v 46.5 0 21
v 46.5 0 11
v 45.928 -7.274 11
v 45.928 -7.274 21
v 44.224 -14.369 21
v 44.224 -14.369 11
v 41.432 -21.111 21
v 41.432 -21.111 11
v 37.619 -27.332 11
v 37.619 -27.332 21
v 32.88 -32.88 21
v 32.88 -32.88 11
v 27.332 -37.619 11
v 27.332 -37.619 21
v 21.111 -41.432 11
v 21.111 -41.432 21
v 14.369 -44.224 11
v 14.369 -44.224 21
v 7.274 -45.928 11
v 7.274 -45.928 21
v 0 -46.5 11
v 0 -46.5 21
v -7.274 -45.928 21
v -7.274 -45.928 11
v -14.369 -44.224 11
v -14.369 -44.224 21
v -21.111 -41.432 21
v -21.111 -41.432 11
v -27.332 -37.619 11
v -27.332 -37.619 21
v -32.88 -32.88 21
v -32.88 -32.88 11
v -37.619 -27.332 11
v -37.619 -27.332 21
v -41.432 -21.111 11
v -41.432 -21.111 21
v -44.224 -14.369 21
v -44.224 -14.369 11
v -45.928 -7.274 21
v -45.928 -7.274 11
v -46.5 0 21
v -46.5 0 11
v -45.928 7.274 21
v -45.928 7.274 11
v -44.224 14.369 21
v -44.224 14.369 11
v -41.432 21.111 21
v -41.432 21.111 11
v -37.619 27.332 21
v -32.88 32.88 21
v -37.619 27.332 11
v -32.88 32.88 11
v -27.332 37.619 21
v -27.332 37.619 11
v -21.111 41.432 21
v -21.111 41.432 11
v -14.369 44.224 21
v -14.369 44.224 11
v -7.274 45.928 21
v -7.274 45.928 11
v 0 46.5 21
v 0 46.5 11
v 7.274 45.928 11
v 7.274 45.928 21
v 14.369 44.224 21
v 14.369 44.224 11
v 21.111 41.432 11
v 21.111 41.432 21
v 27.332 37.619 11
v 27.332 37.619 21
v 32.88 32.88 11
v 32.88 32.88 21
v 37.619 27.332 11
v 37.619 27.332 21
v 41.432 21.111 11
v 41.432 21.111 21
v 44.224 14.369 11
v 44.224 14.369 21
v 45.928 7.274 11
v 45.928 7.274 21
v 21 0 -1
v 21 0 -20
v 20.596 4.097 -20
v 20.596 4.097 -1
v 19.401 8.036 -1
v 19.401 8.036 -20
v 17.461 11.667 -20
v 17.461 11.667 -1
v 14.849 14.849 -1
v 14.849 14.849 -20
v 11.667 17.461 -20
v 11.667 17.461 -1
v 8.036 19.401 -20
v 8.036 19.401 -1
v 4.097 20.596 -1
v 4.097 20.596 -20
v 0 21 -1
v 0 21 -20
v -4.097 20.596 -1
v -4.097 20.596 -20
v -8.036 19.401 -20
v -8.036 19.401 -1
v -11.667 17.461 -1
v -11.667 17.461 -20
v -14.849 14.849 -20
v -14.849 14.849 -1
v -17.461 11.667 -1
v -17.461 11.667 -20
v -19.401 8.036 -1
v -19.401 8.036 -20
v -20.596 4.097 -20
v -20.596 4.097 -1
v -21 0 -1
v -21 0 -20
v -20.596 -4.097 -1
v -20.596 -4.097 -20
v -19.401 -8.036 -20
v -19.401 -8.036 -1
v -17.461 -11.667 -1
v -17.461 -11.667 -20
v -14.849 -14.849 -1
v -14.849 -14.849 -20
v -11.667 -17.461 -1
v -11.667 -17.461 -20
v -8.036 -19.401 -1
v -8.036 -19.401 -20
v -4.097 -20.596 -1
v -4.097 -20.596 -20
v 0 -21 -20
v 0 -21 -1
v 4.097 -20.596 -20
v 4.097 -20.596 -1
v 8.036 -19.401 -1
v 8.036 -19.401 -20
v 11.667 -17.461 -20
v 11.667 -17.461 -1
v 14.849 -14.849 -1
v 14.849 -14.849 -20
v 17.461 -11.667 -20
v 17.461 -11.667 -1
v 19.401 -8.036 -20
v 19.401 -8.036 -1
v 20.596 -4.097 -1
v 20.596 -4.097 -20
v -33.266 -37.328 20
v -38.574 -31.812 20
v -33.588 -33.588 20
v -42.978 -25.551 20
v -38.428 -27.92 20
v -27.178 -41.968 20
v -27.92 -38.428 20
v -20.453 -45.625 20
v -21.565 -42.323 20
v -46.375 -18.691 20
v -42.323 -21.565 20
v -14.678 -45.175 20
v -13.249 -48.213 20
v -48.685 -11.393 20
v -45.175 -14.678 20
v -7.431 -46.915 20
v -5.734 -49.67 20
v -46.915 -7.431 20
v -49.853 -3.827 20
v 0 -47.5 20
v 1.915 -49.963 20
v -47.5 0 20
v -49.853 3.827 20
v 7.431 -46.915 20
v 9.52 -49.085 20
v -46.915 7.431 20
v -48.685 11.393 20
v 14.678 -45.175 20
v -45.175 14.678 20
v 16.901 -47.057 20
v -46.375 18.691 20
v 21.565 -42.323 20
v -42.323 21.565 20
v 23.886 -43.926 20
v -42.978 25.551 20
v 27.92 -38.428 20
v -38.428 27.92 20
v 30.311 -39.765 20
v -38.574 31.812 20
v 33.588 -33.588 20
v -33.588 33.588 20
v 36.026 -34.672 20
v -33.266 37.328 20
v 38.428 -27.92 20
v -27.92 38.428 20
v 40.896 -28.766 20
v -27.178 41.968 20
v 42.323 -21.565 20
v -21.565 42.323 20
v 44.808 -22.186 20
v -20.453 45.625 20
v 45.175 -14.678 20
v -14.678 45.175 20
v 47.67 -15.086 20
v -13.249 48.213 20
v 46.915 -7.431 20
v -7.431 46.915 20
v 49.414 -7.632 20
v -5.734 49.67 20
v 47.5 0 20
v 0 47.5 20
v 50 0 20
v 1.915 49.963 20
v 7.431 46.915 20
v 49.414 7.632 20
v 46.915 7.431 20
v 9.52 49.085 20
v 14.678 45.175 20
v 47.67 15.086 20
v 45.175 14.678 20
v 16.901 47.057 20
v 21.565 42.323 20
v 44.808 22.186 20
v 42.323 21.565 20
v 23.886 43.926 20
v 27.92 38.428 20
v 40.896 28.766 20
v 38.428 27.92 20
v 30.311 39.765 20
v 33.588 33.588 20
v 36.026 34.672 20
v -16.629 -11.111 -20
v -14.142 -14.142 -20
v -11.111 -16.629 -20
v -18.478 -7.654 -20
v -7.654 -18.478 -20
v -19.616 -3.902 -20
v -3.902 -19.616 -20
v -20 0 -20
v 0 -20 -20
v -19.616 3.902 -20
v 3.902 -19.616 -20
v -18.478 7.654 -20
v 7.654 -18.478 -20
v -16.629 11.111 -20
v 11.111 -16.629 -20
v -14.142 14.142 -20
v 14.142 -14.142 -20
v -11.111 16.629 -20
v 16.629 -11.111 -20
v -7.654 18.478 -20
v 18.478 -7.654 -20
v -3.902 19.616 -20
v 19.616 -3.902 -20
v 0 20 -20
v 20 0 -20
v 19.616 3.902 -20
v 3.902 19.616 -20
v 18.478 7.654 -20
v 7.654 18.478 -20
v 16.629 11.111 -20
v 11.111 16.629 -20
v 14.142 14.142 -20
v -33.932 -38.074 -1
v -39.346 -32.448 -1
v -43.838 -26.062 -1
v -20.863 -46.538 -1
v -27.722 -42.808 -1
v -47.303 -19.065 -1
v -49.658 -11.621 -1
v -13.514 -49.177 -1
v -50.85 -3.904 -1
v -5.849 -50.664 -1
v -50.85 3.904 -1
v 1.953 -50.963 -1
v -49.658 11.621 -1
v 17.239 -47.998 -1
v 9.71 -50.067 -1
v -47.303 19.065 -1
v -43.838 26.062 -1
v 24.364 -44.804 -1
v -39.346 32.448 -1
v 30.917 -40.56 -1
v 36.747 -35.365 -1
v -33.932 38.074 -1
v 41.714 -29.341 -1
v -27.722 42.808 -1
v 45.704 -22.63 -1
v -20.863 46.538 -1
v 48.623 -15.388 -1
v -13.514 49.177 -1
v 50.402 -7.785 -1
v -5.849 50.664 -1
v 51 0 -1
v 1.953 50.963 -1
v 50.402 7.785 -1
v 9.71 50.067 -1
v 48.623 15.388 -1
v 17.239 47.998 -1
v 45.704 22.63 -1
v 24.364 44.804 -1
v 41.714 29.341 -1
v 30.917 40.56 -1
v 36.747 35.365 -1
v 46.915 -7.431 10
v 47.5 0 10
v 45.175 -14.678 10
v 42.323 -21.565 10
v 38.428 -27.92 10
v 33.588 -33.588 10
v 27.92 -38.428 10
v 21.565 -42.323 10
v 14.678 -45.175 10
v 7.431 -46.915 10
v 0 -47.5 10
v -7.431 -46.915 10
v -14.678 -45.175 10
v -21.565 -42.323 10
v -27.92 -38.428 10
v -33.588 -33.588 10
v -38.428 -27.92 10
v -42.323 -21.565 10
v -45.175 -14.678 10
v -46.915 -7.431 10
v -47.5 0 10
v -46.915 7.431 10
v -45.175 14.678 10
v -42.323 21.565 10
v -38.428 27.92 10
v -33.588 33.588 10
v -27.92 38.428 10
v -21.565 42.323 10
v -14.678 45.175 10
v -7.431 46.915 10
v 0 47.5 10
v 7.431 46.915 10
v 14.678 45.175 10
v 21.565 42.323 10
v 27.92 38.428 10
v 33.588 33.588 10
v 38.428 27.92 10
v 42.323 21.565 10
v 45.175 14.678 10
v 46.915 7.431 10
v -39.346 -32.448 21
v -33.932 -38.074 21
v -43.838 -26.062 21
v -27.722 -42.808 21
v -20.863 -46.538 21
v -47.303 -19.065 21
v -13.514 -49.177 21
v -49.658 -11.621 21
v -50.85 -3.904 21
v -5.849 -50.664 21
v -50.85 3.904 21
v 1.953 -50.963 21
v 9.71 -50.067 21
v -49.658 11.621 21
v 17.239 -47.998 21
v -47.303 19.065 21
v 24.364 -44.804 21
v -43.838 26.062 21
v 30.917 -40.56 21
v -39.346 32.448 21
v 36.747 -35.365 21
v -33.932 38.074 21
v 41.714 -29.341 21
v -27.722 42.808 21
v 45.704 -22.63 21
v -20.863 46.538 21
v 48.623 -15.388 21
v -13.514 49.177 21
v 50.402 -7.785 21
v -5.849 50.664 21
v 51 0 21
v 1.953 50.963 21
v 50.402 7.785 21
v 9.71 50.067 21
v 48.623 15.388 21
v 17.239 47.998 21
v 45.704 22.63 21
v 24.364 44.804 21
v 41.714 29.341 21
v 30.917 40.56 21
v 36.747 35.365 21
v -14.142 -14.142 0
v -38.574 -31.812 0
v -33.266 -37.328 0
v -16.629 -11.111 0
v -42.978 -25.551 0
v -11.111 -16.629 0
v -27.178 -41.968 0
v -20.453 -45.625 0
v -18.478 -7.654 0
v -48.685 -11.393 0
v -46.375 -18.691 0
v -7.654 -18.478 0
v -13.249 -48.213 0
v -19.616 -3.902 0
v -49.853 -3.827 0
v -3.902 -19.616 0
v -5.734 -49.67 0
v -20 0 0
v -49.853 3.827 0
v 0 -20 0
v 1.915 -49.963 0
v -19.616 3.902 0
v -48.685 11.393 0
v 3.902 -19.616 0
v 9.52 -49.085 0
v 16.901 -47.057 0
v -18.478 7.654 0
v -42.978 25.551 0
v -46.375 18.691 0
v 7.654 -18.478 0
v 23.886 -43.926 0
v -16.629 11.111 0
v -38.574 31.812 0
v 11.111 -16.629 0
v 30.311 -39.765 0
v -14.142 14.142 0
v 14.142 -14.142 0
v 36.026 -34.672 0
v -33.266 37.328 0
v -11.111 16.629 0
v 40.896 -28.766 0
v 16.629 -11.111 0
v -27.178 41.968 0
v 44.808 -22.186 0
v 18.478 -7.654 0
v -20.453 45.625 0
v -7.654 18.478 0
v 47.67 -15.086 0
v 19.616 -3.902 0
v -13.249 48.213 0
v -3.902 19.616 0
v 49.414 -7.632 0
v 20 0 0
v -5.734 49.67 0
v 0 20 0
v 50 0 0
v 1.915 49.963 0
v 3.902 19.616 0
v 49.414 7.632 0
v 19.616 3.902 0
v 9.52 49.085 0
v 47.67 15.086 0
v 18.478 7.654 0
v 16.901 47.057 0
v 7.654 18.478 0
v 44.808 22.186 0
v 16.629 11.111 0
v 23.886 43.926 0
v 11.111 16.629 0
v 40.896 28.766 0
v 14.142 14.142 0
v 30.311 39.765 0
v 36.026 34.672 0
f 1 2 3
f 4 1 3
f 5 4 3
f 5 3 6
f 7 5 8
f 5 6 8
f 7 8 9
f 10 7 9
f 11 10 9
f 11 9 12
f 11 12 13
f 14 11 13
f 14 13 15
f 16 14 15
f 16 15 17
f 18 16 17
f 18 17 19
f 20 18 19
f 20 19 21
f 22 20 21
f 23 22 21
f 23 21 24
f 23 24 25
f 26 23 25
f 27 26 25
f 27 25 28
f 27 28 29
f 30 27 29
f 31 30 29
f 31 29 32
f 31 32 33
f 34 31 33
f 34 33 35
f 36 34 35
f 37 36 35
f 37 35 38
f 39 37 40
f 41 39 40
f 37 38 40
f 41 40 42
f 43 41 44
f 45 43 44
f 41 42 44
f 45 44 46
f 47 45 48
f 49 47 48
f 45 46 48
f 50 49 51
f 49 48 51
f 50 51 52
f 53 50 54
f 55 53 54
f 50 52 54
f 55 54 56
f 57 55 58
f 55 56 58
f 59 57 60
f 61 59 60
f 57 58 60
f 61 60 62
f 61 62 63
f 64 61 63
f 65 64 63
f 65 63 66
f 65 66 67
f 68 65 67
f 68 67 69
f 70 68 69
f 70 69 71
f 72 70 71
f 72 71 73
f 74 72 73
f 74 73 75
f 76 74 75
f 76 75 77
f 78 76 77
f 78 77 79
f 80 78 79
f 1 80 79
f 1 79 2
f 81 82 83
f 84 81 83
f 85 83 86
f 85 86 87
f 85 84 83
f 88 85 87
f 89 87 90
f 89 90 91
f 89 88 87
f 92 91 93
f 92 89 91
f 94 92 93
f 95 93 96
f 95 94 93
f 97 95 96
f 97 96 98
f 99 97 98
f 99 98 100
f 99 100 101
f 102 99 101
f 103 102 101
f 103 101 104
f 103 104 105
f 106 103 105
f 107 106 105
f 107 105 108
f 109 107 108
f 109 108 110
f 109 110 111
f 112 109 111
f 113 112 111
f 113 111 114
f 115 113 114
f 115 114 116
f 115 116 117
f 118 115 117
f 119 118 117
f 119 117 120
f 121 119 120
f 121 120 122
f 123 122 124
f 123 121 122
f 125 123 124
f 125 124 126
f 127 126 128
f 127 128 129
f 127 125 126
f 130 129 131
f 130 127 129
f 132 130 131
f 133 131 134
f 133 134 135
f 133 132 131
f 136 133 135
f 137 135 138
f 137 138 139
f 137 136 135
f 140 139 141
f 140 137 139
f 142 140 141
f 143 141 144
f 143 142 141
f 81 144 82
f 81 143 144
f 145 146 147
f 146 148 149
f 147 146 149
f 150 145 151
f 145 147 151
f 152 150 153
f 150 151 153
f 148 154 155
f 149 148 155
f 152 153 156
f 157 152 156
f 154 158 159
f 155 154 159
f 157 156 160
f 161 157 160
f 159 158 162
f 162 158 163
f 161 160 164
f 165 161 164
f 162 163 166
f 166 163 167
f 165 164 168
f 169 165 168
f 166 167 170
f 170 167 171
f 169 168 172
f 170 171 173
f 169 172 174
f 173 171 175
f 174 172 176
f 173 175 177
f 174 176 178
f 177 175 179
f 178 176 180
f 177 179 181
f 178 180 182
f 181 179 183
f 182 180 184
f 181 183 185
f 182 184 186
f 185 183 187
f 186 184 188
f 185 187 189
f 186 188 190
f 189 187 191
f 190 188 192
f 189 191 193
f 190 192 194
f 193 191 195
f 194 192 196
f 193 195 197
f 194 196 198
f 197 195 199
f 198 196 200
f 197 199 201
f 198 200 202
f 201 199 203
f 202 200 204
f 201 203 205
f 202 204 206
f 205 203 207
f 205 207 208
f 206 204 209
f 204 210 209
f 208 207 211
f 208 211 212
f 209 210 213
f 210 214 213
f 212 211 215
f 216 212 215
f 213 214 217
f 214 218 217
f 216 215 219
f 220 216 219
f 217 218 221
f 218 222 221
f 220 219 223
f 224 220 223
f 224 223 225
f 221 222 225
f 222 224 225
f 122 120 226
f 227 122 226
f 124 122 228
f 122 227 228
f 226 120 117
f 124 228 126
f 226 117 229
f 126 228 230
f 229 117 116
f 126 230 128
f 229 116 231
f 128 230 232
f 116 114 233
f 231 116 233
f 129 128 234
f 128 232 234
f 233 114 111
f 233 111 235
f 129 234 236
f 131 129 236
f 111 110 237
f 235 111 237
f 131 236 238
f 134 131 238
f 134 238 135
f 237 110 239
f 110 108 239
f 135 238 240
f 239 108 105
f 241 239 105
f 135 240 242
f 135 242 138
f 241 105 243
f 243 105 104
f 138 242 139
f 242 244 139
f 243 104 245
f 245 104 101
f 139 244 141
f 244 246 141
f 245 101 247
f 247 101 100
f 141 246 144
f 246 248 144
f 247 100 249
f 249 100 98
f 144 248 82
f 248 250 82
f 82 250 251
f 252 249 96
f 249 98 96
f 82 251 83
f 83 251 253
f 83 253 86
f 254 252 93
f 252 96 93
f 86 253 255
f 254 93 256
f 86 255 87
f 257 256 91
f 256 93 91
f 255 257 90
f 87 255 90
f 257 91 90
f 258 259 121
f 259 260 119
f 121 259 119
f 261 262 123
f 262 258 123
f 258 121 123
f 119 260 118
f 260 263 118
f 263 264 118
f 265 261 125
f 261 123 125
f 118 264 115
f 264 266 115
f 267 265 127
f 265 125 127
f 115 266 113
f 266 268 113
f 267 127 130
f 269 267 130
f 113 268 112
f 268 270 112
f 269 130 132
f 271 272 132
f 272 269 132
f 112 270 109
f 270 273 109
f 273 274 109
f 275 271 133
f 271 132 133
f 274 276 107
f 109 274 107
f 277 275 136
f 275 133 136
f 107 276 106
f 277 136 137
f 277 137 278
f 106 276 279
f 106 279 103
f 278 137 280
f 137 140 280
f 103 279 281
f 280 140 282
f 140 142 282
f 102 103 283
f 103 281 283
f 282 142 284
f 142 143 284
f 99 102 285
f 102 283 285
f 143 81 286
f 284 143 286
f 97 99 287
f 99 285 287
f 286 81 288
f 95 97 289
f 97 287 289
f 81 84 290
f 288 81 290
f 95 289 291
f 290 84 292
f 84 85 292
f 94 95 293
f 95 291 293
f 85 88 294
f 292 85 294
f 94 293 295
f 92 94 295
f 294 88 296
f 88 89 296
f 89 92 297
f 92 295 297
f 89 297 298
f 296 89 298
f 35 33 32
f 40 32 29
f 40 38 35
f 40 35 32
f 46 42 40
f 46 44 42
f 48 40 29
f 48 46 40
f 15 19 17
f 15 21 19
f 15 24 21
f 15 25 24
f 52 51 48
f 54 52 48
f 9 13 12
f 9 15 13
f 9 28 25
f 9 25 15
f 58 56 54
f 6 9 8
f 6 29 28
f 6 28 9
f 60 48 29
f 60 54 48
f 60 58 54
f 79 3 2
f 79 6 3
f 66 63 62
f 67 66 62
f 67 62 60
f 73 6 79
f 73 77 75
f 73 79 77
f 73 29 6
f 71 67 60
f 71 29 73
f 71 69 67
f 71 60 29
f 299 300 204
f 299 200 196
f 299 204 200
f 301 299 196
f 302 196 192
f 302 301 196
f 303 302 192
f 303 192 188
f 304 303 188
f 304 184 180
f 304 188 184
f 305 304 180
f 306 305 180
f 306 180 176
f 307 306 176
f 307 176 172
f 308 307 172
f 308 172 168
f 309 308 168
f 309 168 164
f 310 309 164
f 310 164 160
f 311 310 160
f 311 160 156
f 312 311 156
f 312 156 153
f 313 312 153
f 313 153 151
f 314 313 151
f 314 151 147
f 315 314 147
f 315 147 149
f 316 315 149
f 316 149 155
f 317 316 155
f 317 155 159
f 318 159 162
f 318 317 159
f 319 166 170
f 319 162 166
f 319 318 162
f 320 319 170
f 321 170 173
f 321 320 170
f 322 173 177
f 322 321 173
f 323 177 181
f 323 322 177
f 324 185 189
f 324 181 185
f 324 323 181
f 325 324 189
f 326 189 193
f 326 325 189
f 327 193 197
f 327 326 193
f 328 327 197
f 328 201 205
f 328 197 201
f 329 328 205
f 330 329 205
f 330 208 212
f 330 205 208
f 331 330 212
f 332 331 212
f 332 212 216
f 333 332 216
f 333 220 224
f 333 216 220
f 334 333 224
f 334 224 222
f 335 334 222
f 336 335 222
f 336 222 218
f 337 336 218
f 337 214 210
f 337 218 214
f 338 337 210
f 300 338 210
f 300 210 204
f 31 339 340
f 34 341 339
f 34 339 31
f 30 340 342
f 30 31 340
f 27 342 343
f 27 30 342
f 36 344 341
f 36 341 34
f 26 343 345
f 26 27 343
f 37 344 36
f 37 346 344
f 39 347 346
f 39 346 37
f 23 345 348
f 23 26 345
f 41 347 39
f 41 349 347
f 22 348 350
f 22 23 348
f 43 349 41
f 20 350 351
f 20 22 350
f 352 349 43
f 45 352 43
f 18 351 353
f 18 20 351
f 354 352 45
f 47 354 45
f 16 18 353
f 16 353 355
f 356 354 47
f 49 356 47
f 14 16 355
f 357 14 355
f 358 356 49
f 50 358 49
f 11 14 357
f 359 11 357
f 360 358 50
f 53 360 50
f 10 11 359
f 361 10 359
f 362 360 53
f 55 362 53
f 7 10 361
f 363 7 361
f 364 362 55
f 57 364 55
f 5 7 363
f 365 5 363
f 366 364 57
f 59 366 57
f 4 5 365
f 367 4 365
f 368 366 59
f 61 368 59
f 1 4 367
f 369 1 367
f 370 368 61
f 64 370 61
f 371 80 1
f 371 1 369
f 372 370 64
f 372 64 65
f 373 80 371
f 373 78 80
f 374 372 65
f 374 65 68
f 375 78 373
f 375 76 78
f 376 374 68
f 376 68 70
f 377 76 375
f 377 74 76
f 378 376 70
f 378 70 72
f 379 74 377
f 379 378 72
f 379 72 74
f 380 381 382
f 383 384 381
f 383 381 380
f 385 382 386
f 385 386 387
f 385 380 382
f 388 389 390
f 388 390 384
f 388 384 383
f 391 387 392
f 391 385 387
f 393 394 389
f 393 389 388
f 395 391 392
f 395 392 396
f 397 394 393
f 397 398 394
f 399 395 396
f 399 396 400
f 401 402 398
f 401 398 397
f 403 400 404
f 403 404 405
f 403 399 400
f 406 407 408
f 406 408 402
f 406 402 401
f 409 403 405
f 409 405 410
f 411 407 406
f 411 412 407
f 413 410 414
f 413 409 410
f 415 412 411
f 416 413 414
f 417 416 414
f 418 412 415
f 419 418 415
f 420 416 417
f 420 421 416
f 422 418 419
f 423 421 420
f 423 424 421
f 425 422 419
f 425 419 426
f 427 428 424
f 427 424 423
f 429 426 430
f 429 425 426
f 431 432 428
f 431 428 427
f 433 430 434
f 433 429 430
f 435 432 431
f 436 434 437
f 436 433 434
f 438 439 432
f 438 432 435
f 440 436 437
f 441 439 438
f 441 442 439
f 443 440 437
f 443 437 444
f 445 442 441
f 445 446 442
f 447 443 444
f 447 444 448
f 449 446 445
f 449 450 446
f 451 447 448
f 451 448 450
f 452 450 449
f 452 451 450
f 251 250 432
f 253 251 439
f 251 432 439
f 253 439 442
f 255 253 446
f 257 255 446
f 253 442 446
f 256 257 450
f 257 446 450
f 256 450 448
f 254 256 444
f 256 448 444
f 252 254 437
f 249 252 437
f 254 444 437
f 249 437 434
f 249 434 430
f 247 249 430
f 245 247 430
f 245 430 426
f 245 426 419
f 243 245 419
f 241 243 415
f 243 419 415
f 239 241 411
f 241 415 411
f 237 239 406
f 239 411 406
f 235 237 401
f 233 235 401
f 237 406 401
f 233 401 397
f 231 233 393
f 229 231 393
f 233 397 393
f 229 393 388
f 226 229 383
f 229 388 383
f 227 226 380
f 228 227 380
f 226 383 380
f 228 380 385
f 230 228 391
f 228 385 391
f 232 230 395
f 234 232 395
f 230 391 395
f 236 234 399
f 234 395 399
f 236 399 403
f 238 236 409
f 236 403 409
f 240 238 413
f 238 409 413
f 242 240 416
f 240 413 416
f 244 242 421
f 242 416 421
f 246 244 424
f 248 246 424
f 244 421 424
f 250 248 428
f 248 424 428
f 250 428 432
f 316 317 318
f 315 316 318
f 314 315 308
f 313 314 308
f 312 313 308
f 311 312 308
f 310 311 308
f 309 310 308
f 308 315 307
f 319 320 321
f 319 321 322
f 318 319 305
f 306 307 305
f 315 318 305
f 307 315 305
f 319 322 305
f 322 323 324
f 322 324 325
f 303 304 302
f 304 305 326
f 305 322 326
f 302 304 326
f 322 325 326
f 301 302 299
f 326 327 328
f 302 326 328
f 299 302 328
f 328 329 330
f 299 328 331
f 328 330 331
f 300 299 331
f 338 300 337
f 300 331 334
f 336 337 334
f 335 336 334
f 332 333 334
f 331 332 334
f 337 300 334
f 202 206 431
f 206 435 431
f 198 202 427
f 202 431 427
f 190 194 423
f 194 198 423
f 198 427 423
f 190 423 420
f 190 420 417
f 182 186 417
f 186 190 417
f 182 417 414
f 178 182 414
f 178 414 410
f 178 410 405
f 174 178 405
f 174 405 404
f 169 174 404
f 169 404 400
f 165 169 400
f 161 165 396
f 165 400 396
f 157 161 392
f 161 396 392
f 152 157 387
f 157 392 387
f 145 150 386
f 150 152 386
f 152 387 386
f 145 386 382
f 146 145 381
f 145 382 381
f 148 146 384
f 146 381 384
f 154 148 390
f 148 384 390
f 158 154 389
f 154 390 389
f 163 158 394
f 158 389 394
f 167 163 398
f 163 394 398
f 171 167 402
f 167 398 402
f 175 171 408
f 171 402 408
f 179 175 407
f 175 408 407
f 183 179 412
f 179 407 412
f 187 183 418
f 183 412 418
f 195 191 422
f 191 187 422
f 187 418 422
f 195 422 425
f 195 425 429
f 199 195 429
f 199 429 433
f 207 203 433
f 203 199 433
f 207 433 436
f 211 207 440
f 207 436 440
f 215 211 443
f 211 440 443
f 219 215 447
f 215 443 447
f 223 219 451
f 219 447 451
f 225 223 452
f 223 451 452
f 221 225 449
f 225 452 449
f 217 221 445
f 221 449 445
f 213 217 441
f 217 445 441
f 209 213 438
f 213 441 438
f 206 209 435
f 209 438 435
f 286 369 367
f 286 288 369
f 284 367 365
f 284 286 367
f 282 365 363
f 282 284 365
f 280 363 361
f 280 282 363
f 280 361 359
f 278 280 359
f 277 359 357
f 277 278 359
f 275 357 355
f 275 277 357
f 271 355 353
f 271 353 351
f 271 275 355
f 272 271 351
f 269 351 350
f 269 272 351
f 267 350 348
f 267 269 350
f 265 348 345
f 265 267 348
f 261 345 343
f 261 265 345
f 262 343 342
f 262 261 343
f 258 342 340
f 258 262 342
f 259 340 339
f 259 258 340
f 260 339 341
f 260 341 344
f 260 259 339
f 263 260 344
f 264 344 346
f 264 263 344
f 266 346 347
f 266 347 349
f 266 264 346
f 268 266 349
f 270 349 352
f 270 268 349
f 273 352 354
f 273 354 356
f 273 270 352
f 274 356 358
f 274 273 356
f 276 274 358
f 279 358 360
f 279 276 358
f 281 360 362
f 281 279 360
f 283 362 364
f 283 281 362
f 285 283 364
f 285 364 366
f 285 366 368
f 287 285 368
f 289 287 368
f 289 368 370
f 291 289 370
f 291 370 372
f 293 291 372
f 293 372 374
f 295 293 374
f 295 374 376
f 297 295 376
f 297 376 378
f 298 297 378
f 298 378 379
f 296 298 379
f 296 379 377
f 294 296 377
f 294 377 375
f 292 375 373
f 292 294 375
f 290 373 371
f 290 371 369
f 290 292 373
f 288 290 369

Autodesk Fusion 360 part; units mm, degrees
sketch "Sketch1" plane through (0, 0, 0) normal (0, 0, 1) x (1, 0, 0)
  circle A0 centre (0, 0) radius 50
extrude "Extrude1" add sketch "Sketch1" along normal blind 20
ref_plane "WorkPlane1" through (0, 0, 10) normal (0, 0, 1) x (1, 0, 0)
sketch "Sketch2" plane through (0, 0, 10) normal (0, 0, 1) x (1, 0, 0)
  circle A0 centre (0, 0) radius 47.5
extrude "Extrude2" cut sketch "Sketch2" along normal blind 10
sketch "Sketch3" plane through (0, 0, 0) normal (0, 0, 1) x (1, 0, 0)
  circle A0 centre (0, 0) radius 20
extrude "Extrude3" add sketch "Sketch3" against normal blind 20
sketch "Sketch4" plane through (0, 0, -20) normal (0, 0, -1) x (1, 0, 0)
  circle A0 centre (0, 0) radius 20
shell "Shell1" thickness 1 outward yes removed faces 1 at (6.3705, -1.965, -20)
